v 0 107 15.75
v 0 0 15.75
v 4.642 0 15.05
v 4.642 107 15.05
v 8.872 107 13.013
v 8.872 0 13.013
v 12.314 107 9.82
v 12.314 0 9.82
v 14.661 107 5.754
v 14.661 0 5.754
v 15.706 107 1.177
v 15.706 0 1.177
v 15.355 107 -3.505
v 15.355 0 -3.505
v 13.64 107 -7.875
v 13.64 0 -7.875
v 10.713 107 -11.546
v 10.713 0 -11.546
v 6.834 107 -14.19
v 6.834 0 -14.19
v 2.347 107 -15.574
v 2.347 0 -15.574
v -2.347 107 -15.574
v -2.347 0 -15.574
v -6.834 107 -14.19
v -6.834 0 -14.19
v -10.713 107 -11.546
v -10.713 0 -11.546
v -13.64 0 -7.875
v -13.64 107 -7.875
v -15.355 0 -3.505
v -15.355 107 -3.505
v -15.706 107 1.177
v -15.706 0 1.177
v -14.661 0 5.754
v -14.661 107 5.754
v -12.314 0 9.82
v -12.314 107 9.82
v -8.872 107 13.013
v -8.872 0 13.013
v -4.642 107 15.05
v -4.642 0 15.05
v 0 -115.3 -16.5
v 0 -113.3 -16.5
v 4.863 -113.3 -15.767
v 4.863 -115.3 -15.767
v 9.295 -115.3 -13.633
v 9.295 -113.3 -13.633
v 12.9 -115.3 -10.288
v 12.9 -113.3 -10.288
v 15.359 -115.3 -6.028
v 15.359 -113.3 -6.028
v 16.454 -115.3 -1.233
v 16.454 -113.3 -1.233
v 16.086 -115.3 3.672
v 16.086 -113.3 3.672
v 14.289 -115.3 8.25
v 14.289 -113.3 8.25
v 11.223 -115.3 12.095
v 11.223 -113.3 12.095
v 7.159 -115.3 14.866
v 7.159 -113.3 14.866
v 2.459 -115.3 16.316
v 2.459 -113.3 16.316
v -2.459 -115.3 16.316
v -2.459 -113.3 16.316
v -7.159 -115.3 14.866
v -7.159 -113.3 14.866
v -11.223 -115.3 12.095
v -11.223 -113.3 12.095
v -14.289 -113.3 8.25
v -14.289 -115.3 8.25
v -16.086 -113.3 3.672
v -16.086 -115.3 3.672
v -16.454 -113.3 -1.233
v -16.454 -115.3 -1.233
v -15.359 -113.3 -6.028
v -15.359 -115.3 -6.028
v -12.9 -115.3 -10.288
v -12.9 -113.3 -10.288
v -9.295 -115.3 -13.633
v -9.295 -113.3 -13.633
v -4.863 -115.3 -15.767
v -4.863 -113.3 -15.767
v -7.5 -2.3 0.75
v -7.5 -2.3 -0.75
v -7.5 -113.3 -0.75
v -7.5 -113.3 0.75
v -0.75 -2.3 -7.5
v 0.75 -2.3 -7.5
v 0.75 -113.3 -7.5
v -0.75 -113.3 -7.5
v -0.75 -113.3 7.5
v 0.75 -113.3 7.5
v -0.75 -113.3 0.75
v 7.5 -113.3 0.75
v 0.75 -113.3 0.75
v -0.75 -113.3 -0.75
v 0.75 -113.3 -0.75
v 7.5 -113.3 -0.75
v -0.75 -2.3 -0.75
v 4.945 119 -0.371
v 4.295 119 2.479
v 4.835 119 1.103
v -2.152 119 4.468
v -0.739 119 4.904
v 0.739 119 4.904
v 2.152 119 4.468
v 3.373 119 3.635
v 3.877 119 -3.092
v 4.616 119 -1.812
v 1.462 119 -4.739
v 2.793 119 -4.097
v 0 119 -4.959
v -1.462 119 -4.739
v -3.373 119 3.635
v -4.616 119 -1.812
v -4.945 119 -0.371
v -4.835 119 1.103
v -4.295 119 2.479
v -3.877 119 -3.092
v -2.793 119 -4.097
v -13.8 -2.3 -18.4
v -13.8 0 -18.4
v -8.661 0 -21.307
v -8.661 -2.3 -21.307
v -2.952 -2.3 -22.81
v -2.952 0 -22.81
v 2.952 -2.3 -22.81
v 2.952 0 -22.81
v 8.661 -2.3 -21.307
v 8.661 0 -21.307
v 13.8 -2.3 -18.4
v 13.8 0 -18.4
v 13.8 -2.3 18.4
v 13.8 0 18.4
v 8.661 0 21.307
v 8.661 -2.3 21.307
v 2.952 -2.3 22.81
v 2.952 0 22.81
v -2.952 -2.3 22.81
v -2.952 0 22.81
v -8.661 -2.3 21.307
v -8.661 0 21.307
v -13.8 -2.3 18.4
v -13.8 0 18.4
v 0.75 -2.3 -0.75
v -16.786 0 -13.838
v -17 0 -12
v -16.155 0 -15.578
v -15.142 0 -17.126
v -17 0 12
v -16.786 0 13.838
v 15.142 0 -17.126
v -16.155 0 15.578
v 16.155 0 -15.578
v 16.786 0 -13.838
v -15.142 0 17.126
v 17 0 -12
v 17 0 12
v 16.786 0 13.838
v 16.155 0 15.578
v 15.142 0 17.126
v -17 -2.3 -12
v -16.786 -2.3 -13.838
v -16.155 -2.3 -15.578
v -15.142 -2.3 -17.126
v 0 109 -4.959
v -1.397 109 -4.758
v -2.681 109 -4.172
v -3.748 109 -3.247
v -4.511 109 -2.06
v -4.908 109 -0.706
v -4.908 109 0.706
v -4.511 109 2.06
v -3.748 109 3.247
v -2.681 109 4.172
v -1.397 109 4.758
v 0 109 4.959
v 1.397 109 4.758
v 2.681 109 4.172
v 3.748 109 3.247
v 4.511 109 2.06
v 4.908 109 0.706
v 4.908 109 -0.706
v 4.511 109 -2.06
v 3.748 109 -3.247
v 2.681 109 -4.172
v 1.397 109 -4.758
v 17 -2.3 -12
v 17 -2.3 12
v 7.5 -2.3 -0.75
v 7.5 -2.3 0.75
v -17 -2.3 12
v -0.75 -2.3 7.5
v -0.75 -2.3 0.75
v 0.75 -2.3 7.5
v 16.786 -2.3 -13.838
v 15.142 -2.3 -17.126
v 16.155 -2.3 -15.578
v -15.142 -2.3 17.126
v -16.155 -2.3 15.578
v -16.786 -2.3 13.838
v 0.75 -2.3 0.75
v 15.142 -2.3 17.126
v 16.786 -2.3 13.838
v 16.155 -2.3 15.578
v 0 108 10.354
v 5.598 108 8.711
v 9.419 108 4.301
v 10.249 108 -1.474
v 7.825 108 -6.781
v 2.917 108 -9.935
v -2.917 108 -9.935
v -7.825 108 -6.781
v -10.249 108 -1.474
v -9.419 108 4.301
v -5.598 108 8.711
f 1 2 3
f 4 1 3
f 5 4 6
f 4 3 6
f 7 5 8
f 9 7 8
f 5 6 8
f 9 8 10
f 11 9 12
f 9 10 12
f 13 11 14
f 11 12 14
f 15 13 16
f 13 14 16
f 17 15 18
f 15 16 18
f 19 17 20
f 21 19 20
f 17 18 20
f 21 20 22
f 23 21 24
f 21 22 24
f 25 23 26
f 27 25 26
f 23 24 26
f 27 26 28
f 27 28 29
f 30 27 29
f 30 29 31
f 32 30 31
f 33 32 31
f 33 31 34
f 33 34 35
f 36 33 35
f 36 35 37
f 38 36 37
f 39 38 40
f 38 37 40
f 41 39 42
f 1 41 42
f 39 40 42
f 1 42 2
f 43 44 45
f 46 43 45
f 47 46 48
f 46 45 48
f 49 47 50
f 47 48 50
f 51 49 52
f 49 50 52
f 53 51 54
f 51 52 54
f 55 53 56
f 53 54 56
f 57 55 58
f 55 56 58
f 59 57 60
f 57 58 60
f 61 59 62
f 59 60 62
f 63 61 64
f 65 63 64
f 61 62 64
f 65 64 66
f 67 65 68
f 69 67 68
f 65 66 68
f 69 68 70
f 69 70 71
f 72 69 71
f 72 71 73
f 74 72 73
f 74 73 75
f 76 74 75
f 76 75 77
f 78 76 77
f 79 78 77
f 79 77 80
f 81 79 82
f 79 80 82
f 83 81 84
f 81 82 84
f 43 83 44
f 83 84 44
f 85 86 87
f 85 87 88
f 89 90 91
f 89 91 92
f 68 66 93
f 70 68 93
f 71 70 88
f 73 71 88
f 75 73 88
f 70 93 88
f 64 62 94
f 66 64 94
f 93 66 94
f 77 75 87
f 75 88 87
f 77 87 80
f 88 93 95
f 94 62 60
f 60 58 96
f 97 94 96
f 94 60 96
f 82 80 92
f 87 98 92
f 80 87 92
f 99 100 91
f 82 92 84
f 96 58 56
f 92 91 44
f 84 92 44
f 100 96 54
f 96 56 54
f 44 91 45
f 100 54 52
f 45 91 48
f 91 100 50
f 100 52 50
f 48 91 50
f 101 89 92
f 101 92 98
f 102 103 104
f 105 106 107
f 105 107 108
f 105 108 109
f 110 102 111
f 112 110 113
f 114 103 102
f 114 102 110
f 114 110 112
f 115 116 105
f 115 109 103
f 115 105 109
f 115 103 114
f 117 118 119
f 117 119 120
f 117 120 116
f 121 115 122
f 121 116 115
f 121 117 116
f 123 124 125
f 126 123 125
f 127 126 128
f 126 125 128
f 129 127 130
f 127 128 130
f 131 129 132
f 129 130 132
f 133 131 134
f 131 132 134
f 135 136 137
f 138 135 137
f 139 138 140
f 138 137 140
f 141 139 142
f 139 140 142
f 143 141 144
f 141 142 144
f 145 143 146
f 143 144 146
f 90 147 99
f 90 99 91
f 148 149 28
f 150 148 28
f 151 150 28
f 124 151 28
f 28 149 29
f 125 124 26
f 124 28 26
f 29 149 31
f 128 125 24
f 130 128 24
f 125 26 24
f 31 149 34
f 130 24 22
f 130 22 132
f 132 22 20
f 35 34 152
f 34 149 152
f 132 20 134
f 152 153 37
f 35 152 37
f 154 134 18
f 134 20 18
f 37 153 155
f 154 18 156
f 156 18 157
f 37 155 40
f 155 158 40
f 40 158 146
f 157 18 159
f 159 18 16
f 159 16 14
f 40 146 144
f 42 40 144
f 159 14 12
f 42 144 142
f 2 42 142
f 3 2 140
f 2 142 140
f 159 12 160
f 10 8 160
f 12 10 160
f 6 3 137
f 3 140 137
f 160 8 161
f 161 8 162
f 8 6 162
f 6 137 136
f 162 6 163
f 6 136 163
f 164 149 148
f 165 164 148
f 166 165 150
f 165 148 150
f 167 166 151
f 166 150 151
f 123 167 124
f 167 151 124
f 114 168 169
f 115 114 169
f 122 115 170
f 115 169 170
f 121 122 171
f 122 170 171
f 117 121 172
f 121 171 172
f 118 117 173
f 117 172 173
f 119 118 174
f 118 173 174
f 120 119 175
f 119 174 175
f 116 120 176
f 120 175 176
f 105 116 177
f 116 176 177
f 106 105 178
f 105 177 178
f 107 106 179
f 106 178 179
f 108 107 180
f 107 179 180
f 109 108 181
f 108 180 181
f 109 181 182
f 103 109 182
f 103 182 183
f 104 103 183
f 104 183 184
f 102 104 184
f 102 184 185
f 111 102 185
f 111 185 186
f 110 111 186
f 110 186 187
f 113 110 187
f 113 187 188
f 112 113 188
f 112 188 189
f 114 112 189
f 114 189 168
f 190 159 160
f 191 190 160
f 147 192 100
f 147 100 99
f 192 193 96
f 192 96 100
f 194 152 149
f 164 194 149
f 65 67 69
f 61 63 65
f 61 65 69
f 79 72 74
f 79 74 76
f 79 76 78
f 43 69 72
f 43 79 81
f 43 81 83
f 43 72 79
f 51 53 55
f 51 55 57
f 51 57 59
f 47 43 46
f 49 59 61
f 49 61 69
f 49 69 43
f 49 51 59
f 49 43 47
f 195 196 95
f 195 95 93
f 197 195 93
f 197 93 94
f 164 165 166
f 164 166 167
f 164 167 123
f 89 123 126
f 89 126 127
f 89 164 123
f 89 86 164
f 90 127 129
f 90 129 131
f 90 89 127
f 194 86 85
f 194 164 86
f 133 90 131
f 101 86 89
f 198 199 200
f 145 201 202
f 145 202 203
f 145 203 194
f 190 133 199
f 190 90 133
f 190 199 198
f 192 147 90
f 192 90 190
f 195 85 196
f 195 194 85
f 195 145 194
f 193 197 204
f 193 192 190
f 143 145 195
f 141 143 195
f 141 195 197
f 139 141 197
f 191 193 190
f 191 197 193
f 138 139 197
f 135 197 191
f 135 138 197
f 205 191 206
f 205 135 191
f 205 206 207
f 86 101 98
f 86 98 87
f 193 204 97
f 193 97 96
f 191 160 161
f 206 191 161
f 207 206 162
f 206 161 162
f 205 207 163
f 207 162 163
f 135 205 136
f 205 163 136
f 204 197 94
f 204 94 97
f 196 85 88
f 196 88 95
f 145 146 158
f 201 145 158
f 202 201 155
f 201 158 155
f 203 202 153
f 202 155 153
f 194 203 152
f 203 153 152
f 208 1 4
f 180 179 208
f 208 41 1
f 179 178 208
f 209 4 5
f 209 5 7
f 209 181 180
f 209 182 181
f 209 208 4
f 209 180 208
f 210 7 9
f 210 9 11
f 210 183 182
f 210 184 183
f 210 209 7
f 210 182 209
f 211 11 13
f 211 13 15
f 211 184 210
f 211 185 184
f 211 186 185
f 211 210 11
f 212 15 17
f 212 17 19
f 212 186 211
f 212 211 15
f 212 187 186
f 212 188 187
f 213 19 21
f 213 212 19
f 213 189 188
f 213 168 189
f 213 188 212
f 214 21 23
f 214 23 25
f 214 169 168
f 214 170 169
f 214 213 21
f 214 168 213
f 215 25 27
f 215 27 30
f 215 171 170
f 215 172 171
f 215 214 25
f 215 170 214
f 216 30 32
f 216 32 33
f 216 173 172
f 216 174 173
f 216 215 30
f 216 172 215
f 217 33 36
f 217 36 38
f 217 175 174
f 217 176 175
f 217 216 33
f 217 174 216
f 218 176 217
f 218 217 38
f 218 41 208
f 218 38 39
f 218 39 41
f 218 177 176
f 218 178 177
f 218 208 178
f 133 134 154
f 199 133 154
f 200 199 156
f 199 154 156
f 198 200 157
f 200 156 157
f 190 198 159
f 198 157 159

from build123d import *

# Parameters (mm, degrees)
SKETCH1_R           = 15.75
BOSS_EXTRUDE1_DEPTH = 109
CHAMFER1_SIZE       = 2
CHAMFER1_SIZE2      = 10.791034349
SKETCH2_R           = 4.958965651
BOSS_EXTRUDE2_DEPTH = 10
BOSS_EXTRUDE3_DEPTH = 2.3
BOSS_EXTRUDE4_DEPTH = 111
SKETCH5_R           = 16.5
BOSS_EXTRUDE5_DEPTH = 2


with BuildPart() as part:
    # Sketch1 → Boss-Extrude1 (new body)
    with BuildSketch(Plane(origin=(0, 0, 0), x_dir=(1, 0, 0), z_dir=(0, 1, 0))):
        with Locations(Location((0, 0, 0), (0, 0, 270))):
            Circle(SKETCH1_R)
    extrude(amount=BOSS_EXTRUDE1_DEPTH)

    # Chamfer1
    chamfer1_edges = [part.edges().sort_by_distance(p)[0] for p in [
        (0, 109, -15.75),
    ]]
    chamfer1_side = [part.faces().sort_by_distance(p)[0] for p in [
        (0, 54.5, -15.75),
    ]]
    chamfer(chamfer1_edges, length=CHAMFER1_SIZE, length2=CHAMFER1_SIZE2, reference=chamfer1_side[0])

    # Sketch2 → Boss-Extrude2 (add)
    with BuildSketch(Plane(origin=(0, 109, 0), x_dir=(1, 0, 0), z_dir=(0, 1, 0))):
        with Locations(Location((0, 0, 0), (0, 0, 90))):
            Circle(SKETCH2_R)
    extrude(amount=BOSS_EXTRUDE2_DEPTH)

    # Sketch3 → Boss-Extrude3 (add)
    with BuildSketch(Plane.XZ):
        with BuildLine():
            Line((-17, 12), (-17, -12))
            ThreePointArc((-17, -12), (-16.155417528, -15.577708764), (-13.8, -18.4))
            ThreePointArc((-13.8, -18.4), (0, -23), (13.8, -18.4))
            ThreePointArc((13.8, -18.4), (16.155417528, -15.577708764), (17, -12))
            Line((17, -12), (17, 12))
            ThreePointArc((17, 12), (16.155417528, 15.577708764), (13.8, 18.4))
            ThreePointArc((13.8, 18.4), (0, 23), (-13.8, 18.4))
            ThreePointArc((-13.8, 18.4), (-16.155417528, 15.577708764), (-17, 12))
        make_face()
    extrude(amount=BOSS_EXTRUDE3_DEPTH)

    # Sketch4 → Boss-Extrude4 (add)
    with BuildSketch(Plane.XZ.offset(2.3)):
        Polygon((0.75, 0.75), (7.5, 0.75), (7.5, -0.75), (0.75, -0.75), (0.75, -7.5), (-0.75, -7.5), (-0.75, -0.75), (-7.5, -0.75), (-7.5, 0.75), (-0.75, 0.75), (-0.75, 7.5), (0.75, 7.5), align=None)
    extrude(amount=BOSS_EXTRUDE4_DEPTH)

    # Sketch5 → Boss-Extrude5 (add)
    with BuildSketch(Plane.XZ.offset(113.3)):
        with Locations(Location((0, 0, 0), (0, 0, 270))):
            Circle(SKETCH5_R)
    extrude(amount=BOSS_EXTRUDE5_DEPTH)


solid = part.part
